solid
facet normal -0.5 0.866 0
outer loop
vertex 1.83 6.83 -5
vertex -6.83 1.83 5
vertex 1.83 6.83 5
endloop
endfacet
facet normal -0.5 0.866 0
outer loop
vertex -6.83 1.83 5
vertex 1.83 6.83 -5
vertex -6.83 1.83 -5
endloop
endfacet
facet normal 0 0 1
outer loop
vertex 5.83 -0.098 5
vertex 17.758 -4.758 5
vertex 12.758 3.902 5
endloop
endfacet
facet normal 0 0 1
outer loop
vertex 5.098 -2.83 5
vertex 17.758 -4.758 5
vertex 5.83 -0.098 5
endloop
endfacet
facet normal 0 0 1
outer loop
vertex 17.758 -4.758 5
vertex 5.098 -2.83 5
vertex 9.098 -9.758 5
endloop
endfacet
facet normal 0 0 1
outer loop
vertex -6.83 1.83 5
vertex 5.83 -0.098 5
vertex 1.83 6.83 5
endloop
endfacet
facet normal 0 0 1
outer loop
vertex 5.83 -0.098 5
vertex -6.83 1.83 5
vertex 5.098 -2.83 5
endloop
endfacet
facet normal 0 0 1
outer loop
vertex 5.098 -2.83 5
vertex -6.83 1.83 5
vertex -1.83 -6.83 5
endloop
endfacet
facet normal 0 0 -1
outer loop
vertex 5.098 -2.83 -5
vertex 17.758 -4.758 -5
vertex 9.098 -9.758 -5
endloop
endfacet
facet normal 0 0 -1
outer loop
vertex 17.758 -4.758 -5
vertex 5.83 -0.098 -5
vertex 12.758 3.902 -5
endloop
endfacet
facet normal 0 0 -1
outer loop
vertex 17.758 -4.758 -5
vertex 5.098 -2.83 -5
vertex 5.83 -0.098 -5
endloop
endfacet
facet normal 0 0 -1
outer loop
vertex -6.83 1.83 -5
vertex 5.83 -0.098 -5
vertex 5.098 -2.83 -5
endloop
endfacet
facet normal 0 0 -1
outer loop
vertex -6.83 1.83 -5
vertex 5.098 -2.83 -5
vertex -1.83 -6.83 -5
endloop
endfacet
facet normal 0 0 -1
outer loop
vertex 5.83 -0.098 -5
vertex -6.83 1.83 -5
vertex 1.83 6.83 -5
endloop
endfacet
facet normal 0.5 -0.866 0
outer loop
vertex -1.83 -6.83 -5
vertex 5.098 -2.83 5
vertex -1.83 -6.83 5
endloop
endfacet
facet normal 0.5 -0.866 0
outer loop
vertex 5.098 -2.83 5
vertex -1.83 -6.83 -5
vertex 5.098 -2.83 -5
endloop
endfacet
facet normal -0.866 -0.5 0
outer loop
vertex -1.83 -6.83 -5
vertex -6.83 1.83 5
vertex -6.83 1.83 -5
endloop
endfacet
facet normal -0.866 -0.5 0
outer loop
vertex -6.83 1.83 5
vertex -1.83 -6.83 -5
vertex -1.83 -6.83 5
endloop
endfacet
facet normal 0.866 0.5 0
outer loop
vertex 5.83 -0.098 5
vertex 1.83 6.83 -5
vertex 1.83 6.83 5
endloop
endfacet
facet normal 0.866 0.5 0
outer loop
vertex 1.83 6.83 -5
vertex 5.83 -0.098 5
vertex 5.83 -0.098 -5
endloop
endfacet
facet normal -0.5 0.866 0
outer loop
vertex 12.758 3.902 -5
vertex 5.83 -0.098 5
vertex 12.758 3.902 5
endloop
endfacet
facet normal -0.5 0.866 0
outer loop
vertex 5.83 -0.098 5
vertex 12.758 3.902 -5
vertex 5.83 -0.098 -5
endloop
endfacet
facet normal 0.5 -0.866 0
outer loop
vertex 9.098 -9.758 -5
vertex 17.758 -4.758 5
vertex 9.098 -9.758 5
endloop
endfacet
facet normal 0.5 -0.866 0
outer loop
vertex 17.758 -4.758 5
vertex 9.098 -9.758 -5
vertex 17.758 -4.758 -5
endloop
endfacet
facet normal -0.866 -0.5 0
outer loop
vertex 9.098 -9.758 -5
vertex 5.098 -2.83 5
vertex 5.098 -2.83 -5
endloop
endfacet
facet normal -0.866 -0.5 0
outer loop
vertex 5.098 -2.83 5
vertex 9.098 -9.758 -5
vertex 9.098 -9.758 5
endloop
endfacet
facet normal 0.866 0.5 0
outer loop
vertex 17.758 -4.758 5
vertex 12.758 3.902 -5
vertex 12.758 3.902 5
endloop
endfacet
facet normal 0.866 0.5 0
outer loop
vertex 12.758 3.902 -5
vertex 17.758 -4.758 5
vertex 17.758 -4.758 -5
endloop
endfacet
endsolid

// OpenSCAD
rotate([0,0,90])
difference() {
    rotate([0,0,+30]) {
        cube(10, center=true);
        translate([-8,-8,0])
            cube(10, center=true);
    }
}
